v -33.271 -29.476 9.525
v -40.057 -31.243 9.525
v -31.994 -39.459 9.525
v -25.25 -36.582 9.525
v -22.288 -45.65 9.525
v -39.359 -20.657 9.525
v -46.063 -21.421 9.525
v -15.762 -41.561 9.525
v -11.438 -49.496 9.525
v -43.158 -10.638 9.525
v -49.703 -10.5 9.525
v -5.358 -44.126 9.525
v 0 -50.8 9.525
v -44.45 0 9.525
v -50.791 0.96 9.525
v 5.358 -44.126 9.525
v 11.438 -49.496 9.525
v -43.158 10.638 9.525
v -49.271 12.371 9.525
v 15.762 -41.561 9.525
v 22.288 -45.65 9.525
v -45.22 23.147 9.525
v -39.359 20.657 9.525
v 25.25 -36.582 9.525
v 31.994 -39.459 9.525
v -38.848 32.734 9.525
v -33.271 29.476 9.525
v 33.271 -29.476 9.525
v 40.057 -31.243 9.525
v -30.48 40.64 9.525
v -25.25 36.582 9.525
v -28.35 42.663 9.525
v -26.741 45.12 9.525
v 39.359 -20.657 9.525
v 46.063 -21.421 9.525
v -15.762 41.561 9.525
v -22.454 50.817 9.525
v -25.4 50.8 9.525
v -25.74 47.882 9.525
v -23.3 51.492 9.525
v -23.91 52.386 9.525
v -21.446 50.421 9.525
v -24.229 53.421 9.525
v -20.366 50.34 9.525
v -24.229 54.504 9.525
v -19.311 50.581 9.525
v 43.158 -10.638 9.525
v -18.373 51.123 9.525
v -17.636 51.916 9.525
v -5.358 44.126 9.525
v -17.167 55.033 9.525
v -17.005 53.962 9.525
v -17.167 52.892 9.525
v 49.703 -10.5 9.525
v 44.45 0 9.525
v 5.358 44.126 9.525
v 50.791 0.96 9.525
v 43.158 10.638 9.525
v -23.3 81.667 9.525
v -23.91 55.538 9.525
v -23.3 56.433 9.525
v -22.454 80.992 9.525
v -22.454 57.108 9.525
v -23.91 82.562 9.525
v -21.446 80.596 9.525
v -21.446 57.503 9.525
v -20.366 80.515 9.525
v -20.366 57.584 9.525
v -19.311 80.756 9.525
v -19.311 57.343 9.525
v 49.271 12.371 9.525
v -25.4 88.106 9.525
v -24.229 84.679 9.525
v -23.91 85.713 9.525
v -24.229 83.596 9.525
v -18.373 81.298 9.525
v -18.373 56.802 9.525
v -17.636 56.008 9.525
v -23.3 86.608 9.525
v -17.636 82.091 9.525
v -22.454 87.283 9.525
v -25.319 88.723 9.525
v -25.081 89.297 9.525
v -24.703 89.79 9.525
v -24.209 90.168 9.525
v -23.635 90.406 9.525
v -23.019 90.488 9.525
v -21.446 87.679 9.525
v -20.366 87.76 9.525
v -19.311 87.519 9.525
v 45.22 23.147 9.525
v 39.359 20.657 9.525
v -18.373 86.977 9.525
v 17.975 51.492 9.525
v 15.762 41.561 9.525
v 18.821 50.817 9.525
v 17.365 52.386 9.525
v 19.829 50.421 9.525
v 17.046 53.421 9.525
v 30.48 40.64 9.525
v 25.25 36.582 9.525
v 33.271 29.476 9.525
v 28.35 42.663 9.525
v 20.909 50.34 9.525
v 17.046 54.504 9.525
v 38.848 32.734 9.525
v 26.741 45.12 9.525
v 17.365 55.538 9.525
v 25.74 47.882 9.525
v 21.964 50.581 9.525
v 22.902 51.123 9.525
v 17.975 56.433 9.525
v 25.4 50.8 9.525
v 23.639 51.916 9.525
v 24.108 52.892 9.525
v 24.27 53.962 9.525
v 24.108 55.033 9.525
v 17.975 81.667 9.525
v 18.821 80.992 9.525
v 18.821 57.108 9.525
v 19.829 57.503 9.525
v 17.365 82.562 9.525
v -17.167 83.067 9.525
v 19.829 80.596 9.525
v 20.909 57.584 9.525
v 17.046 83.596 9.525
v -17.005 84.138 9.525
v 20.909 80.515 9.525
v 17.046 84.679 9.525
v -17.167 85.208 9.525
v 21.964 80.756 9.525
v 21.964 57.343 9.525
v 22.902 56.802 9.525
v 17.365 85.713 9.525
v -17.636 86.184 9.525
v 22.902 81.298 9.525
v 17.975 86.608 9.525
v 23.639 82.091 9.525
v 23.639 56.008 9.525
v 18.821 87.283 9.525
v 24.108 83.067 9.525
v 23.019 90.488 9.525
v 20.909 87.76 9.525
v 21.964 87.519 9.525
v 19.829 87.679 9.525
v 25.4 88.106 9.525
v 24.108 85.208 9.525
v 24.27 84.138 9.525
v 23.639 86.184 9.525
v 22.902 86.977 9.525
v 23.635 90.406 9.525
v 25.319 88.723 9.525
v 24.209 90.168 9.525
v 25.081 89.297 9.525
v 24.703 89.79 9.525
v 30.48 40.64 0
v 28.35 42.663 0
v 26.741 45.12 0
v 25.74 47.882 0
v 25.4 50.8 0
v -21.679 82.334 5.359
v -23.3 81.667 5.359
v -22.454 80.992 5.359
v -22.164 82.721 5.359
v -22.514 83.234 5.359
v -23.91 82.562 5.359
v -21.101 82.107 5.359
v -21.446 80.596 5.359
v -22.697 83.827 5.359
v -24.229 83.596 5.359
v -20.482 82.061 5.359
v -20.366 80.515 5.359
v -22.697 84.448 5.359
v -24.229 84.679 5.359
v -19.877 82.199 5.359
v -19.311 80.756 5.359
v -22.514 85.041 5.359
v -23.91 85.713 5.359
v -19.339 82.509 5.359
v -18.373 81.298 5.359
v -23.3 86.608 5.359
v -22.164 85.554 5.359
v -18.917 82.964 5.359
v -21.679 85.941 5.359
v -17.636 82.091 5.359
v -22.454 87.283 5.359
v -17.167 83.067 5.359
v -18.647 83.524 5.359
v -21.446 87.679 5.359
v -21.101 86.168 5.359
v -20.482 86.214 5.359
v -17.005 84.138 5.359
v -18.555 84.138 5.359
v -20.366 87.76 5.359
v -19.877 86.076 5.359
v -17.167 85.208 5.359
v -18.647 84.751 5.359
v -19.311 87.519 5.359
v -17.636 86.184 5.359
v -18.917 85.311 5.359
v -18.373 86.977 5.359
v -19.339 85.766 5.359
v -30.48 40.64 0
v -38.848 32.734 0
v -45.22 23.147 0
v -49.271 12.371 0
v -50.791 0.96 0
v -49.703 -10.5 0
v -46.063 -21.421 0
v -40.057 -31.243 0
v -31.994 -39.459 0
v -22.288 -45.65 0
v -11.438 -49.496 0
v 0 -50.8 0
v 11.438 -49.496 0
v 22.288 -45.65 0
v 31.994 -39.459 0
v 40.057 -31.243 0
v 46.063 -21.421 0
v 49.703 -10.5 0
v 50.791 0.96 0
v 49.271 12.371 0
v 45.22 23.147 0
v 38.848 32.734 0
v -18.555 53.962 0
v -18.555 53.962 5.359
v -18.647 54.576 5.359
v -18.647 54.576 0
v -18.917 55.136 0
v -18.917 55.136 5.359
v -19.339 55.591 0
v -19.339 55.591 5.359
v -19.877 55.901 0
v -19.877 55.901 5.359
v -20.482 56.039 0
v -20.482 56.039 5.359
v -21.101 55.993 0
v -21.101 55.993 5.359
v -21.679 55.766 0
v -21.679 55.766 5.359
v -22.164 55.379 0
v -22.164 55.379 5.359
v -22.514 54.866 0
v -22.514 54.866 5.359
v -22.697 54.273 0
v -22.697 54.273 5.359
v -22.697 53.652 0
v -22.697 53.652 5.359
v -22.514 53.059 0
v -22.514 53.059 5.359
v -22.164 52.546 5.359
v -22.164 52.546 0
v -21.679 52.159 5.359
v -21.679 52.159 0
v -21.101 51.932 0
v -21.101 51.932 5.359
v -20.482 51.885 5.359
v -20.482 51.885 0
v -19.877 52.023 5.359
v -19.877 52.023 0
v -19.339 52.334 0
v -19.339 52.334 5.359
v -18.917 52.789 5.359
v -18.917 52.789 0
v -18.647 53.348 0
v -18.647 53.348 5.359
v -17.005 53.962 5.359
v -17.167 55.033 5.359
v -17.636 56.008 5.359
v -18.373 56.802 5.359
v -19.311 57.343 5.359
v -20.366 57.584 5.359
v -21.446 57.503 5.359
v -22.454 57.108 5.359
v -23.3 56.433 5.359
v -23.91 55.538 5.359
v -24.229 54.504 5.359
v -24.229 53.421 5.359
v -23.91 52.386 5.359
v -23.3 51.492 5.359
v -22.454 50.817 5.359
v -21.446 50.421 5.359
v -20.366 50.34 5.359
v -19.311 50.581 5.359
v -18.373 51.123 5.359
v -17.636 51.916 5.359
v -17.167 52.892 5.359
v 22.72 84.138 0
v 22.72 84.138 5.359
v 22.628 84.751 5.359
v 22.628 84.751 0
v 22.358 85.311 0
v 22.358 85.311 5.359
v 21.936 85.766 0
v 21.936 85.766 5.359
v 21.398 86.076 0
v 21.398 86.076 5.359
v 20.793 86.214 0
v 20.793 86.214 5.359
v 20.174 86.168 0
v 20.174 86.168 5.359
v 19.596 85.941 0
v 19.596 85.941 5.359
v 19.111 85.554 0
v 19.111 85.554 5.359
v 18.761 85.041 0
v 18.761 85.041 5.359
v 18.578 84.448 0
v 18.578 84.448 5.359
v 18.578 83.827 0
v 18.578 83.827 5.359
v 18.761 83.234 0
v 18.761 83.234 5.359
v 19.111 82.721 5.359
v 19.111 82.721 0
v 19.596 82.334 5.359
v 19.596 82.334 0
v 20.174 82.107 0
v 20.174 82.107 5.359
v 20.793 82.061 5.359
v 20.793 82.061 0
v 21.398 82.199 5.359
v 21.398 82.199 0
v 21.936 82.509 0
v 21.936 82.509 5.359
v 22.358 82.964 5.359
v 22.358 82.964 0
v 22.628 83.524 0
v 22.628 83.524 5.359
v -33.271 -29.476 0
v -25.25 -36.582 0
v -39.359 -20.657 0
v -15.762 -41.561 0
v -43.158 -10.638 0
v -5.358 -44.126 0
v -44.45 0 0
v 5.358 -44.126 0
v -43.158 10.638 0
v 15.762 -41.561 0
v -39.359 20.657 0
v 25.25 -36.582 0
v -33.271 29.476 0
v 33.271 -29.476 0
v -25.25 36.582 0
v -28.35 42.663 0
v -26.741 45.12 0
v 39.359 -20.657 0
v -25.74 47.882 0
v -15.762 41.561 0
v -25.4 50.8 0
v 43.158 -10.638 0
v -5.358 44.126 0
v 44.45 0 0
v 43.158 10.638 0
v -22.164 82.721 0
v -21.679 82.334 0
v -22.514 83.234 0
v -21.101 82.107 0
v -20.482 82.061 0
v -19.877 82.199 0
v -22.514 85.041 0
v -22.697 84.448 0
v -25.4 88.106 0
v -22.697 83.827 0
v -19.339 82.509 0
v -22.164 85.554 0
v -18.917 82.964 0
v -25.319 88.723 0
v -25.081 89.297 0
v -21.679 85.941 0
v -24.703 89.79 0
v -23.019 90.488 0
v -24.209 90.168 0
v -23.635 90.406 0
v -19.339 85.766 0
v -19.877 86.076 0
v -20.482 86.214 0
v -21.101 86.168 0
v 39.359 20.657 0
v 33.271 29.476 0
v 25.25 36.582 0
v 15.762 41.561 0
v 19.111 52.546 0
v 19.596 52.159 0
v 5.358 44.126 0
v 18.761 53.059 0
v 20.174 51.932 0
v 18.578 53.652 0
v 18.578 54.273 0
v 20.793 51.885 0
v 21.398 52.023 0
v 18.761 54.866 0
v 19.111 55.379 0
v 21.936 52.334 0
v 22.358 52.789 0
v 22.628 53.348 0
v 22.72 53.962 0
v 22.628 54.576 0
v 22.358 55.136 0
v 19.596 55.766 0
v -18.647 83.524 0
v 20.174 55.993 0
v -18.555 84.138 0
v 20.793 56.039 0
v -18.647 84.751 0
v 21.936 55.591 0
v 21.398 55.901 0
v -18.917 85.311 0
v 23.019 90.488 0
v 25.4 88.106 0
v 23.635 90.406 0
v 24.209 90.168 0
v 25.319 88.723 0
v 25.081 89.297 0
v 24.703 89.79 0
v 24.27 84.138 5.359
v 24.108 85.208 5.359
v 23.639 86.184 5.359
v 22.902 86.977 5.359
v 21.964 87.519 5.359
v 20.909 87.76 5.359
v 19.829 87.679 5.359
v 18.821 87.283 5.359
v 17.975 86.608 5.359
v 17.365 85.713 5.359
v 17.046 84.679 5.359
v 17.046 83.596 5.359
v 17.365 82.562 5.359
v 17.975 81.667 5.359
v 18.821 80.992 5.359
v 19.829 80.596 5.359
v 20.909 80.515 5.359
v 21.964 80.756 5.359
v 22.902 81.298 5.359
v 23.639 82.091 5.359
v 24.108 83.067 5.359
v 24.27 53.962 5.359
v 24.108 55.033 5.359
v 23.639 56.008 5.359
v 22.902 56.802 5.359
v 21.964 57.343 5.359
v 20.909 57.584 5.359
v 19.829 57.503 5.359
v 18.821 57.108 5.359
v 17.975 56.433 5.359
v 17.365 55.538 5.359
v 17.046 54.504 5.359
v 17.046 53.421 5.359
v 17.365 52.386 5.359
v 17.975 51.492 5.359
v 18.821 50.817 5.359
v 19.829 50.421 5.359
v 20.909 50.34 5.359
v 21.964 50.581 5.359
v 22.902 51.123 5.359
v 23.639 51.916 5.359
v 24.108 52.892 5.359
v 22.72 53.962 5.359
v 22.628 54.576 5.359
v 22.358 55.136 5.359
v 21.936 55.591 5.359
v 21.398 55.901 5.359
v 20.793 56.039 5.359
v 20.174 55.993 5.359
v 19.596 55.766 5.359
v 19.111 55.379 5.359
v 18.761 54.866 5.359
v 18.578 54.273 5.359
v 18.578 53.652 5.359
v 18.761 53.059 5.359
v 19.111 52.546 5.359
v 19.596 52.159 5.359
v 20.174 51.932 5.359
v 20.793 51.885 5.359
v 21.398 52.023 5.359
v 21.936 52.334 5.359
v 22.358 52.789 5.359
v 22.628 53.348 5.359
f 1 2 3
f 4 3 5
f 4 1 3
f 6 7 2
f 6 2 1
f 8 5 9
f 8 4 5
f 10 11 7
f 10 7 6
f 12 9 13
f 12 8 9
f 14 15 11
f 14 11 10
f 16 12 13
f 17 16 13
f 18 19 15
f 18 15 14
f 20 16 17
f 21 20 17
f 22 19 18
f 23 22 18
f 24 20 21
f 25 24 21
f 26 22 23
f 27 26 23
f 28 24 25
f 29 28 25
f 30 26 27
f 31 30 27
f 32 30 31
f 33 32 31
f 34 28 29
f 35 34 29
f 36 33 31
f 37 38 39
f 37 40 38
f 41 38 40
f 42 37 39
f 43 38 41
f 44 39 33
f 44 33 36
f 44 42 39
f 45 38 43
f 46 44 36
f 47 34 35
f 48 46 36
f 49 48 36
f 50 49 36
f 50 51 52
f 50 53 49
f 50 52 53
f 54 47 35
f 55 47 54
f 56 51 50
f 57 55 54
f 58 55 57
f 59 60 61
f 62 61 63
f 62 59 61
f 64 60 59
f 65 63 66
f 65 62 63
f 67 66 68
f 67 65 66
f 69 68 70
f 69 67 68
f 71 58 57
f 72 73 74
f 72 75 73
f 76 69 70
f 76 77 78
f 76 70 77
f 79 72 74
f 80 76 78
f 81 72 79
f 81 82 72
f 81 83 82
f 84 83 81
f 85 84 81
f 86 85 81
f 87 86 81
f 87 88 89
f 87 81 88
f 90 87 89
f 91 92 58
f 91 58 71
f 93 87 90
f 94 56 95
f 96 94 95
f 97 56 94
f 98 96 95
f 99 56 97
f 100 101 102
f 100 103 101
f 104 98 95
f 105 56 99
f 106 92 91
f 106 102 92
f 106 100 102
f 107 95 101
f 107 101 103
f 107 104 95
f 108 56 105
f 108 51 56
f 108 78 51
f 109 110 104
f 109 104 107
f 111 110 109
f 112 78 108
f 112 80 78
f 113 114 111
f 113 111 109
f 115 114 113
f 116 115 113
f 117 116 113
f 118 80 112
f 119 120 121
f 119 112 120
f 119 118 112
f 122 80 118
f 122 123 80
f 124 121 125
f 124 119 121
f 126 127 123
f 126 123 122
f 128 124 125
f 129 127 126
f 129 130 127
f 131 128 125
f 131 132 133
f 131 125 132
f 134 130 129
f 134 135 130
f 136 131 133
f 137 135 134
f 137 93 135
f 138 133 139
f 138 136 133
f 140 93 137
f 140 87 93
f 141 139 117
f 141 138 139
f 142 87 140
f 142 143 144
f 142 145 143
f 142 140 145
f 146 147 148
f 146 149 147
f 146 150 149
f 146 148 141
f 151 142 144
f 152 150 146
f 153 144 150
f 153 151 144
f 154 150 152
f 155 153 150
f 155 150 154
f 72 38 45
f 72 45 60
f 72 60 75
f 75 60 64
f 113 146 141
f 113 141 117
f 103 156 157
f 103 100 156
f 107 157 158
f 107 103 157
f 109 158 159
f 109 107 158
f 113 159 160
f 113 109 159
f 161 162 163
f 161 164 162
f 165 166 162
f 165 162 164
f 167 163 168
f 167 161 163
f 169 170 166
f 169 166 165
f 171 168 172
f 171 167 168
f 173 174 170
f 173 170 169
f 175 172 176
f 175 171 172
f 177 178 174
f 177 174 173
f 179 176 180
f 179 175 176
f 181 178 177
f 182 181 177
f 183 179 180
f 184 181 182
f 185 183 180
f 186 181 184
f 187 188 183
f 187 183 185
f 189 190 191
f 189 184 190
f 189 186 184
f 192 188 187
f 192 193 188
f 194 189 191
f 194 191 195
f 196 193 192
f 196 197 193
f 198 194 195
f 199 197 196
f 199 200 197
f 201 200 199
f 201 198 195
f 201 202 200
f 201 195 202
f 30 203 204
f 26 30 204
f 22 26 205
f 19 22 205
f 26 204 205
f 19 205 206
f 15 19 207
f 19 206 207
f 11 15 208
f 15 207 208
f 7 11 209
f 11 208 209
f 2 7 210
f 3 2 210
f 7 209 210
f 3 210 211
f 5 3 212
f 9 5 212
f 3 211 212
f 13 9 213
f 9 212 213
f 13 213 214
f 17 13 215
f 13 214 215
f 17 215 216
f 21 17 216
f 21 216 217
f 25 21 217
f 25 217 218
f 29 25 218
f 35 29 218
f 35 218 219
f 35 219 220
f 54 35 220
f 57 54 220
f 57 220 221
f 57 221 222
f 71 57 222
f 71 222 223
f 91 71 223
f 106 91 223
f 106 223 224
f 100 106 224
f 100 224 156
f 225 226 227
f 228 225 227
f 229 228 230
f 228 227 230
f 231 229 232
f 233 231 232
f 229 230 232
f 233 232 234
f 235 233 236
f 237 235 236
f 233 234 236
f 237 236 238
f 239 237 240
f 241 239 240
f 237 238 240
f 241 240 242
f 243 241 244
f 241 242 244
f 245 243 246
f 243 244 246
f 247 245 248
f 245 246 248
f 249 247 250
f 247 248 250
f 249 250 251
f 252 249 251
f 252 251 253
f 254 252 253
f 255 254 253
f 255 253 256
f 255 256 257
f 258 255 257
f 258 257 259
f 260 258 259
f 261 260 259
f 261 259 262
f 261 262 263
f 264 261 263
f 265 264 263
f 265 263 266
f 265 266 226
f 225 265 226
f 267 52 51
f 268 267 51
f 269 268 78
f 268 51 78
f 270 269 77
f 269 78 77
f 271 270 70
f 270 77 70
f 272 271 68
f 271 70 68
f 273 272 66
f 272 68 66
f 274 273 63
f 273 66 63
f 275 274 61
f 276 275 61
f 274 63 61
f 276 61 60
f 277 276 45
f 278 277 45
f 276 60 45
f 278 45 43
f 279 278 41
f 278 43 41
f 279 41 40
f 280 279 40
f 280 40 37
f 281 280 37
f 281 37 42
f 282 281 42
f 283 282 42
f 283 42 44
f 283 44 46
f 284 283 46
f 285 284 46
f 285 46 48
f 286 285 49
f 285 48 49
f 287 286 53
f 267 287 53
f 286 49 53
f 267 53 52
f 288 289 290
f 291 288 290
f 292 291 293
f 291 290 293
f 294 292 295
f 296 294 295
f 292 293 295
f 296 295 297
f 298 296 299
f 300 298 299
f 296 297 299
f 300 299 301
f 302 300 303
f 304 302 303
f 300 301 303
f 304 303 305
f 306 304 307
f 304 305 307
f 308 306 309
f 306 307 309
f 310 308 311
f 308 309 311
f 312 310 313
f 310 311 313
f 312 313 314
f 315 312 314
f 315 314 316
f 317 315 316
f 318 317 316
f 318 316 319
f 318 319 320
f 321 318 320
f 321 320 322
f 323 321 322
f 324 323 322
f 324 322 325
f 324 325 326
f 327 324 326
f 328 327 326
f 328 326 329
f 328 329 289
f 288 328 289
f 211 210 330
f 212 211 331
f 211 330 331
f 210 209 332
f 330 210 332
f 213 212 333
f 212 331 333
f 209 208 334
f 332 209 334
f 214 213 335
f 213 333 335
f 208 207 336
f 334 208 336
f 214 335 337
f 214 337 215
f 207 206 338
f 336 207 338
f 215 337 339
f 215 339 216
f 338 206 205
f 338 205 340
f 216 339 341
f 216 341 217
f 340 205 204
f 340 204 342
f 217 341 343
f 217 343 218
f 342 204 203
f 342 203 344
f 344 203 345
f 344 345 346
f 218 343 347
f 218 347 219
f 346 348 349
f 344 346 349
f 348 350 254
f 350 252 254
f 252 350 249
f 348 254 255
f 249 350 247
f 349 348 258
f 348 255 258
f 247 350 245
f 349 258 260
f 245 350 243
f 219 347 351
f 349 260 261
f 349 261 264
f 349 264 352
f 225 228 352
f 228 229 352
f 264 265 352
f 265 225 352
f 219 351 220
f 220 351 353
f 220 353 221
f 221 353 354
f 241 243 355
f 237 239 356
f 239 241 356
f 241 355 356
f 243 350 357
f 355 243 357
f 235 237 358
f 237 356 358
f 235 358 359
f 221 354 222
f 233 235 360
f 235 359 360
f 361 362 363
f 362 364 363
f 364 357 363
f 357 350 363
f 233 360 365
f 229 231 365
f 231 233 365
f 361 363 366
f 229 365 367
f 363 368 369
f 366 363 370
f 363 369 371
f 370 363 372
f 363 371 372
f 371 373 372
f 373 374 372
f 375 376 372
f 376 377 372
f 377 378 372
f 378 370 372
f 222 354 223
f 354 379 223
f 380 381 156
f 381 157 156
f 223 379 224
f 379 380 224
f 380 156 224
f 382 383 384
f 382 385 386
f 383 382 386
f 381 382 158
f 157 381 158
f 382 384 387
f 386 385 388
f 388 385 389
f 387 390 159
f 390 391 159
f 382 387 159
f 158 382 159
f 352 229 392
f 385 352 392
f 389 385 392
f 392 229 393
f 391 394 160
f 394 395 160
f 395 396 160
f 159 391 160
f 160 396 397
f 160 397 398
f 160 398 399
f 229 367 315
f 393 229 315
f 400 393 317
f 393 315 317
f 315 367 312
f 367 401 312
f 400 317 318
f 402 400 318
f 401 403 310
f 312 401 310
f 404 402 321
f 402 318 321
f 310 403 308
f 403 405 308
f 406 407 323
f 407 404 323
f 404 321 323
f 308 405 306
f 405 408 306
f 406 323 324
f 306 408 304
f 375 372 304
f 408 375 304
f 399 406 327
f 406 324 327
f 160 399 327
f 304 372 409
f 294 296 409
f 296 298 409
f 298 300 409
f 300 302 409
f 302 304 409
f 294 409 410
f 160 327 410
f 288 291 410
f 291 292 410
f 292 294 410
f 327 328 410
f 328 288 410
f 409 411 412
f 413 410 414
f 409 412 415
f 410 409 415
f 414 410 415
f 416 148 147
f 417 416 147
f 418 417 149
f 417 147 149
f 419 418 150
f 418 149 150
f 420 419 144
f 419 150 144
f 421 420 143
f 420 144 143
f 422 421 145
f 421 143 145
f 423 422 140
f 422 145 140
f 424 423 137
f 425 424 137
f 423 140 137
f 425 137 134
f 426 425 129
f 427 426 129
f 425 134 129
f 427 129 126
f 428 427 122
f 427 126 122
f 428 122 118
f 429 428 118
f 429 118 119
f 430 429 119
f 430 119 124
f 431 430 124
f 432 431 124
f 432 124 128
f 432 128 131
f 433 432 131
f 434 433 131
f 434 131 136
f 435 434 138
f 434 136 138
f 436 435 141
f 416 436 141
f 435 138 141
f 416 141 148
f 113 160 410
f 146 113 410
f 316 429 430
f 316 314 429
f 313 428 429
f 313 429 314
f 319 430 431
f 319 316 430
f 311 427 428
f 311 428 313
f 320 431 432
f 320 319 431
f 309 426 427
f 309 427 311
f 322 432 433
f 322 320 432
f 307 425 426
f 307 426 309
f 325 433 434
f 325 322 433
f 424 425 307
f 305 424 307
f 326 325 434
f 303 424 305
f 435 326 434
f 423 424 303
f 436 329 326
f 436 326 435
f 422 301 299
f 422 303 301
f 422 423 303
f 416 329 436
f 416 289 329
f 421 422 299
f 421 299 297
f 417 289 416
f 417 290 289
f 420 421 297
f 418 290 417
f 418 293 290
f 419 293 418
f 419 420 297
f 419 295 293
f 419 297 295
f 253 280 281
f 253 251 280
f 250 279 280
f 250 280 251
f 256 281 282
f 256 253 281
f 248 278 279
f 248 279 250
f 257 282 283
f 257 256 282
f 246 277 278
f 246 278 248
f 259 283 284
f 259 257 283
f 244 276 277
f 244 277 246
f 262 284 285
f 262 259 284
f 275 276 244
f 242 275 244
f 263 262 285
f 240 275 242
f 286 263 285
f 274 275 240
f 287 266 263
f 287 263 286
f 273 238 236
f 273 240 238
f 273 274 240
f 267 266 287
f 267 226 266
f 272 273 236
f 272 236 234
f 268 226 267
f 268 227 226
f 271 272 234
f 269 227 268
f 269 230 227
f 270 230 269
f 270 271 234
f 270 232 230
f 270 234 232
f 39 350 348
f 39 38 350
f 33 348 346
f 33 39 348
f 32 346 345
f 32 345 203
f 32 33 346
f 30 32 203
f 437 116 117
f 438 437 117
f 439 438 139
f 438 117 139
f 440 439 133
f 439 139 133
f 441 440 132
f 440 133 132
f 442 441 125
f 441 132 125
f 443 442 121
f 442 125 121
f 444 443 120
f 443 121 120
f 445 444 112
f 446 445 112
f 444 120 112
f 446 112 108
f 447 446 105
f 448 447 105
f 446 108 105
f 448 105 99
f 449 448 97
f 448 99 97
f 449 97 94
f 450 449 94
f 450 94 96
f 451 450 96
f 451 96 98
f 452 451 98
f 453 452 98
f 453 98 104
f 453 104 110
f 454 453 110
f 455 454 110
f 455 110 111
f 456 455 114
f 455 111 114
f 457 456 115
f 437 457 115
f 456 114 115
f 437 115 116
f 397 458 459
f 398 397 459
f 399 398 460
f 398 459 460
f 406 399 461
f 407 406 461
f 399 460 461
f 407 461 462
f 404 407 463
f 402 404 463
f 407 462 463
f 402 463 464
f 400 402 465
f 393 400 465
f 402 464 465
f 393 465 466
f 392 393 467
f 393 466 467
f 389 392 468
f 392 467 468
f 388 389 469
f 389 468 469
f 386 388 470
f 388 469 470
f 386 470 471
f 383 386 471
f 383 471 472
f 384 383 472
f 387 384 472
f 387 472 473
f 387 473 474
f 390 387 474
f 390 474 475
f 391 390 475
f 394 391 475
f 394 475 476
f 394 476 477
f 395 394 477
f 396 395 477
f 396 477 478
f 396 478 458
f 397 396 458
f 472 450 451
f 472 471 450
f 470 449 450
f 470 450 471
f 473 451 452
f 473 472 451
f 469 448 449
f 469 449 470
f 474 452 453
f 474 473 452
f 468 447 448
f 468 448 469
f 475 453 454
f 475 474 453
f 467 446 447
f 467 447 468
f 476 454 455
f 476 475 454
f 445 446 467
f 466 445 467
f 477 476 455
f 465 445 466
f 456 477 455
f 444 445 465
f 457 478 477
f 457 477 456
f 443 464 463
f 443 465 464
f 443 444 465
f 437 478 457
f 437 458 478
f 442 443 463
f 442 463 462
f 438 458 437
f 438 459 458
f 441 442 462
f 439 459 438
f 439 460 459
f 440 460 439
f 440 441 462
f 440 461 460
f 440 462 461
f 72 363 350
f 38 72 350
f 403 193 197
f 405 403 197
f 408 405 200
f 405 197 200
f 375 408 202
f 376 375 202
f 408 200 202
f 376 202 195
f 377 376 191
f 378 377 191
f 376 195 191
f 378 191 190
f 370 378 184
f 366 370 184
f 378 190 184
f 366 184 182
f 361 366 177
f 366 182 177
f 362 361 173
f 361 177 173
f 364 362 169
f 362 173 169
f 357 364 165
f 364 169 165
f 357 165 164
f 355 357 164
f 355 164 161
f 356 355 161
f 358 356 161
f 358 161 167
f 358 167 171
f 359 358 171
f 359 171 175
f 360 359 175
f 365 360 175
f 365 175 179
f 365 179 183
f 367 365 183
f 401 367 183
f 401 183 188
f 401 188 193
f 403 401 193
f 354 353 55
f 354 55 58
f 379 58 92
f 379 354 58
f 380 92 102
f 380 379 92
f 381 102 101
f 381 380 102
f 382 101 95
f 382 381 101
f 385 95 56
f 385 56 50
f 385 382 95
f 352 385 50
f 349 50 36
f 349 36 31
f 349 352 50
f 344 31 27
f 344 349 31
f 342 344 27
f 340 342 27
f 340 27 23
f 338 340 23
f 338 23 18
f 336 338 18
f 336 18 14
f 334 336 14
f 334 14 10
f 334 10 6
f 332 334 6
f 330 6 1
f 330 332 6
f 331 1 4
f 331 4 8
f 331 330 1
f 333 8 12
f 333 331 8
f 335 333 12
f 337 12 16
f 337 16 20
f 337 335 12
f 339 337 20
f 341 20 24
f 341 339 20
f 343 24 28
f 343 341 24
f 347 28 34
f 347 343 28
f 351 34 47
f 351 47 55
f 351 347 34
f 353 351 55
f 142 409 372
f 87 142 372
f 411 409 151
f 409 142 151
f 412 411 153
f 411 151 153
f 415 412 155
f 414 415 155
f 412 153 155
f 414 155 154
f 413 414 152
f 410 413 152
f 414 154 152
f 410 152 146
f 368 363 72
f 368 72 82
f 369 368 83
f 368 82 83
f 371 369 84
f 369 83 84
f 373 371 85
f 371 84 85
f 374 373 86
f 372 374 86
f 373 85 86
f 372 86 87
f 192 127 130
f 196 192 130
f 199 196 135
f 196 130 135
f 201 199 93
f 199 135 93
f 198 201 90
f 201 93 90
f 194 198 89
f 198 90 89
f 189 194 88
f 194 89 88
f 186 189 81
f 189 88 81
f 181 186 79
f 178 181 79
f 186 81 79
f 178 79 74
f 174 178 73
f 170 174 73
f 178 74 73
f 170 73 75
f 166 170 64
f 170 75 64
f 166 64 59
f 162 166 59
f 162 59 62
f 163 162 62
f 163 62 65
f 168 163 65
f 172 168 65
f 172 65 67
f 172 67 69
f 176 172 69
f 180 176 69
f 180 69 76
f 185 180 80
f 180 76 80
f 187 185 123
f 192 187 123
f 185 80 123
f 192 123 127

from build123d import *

# Parameters (mm, degrees)
F0_R     = 44.45
F1_DEPTH = 9.525
F2_R     = 2.0828
F3_DEPTH = 25.4
F4_R     = 3.6322
F5_DEPTH = 4.1656
F6_R     = 2.38125
F7_R     = 12.7


with BuildPart() as f1:
    # F0 (on Top) → F1 (new body)
    with BuildSketch(Plane.XY):
        with BuildLine():
            Line((-25.4, 90.4875), (-25.4, 43.994091))
            ThreePointArc((-25.4, 43.994091), (0, -50.8), (25.4, 43.994091))
            Line((25.4, 43.994091), (25.4, 90.4875))
            Line((25.4, 90.4875), (-25.4, 90.4875))
        make_face()
        Circle(F0_R, mode=Mode.SUBTRACT)
    extrude(amount=F1_DEPTH)

    # F2 (on face) → F3 (cut)
    with BuildSketch(Plane.XY.offset(9.525)):
        with Locations((-20.6375, 84.1375)):
            Circle(F2_R)
        with Locations((20.6375, 84.1375)):
            Circle(F2_R)
        with Locations((20.6375, 53.9623)):
            Circle(F2_R)
        with Locations((-20.6375, 53.9623)):
            Circle(F2_R)
    extrude(amount=-F3_DEPTH, mode=Mode.SUBTRACT)

    # F4 (on face) → F5 (cut)
    with BuildSketch(Plane.XY.offset(9.525)):
        with Locations((-20.6375, 84.1375)):
            Circle(F4_R)
        with Locations((20.6375, 84.1375)):
            Circle(F4_R)
        with Locations((20.6375, 53.9623)):
            Circle(F4_R)
        with Locations((-20.6375, 53.9623)):
            Circle(F4_R)
    extrude(amount=-F5_DEPTH, mode=Mode.SUBTRACT)

    # F6
    f6_edges = [f1.edges().sort_by_distance(p)[0] for p in [
        (-25.4, 90.4875, 4.7625),
        (25.4, 90.4875, 4.7625),
    ]]
    fillet(f6_edges, radius=F6_R)

    # F7
    f7_edges = [f1.edges().sort_by_distance(p)[0] for p in [
        (-25.4, 43.994091, 4.7625),
        (25.4, 43.994091, 4.7625),
    ]]
    fillet(f7_edges, radius=F7_R)


solid = f1.part
